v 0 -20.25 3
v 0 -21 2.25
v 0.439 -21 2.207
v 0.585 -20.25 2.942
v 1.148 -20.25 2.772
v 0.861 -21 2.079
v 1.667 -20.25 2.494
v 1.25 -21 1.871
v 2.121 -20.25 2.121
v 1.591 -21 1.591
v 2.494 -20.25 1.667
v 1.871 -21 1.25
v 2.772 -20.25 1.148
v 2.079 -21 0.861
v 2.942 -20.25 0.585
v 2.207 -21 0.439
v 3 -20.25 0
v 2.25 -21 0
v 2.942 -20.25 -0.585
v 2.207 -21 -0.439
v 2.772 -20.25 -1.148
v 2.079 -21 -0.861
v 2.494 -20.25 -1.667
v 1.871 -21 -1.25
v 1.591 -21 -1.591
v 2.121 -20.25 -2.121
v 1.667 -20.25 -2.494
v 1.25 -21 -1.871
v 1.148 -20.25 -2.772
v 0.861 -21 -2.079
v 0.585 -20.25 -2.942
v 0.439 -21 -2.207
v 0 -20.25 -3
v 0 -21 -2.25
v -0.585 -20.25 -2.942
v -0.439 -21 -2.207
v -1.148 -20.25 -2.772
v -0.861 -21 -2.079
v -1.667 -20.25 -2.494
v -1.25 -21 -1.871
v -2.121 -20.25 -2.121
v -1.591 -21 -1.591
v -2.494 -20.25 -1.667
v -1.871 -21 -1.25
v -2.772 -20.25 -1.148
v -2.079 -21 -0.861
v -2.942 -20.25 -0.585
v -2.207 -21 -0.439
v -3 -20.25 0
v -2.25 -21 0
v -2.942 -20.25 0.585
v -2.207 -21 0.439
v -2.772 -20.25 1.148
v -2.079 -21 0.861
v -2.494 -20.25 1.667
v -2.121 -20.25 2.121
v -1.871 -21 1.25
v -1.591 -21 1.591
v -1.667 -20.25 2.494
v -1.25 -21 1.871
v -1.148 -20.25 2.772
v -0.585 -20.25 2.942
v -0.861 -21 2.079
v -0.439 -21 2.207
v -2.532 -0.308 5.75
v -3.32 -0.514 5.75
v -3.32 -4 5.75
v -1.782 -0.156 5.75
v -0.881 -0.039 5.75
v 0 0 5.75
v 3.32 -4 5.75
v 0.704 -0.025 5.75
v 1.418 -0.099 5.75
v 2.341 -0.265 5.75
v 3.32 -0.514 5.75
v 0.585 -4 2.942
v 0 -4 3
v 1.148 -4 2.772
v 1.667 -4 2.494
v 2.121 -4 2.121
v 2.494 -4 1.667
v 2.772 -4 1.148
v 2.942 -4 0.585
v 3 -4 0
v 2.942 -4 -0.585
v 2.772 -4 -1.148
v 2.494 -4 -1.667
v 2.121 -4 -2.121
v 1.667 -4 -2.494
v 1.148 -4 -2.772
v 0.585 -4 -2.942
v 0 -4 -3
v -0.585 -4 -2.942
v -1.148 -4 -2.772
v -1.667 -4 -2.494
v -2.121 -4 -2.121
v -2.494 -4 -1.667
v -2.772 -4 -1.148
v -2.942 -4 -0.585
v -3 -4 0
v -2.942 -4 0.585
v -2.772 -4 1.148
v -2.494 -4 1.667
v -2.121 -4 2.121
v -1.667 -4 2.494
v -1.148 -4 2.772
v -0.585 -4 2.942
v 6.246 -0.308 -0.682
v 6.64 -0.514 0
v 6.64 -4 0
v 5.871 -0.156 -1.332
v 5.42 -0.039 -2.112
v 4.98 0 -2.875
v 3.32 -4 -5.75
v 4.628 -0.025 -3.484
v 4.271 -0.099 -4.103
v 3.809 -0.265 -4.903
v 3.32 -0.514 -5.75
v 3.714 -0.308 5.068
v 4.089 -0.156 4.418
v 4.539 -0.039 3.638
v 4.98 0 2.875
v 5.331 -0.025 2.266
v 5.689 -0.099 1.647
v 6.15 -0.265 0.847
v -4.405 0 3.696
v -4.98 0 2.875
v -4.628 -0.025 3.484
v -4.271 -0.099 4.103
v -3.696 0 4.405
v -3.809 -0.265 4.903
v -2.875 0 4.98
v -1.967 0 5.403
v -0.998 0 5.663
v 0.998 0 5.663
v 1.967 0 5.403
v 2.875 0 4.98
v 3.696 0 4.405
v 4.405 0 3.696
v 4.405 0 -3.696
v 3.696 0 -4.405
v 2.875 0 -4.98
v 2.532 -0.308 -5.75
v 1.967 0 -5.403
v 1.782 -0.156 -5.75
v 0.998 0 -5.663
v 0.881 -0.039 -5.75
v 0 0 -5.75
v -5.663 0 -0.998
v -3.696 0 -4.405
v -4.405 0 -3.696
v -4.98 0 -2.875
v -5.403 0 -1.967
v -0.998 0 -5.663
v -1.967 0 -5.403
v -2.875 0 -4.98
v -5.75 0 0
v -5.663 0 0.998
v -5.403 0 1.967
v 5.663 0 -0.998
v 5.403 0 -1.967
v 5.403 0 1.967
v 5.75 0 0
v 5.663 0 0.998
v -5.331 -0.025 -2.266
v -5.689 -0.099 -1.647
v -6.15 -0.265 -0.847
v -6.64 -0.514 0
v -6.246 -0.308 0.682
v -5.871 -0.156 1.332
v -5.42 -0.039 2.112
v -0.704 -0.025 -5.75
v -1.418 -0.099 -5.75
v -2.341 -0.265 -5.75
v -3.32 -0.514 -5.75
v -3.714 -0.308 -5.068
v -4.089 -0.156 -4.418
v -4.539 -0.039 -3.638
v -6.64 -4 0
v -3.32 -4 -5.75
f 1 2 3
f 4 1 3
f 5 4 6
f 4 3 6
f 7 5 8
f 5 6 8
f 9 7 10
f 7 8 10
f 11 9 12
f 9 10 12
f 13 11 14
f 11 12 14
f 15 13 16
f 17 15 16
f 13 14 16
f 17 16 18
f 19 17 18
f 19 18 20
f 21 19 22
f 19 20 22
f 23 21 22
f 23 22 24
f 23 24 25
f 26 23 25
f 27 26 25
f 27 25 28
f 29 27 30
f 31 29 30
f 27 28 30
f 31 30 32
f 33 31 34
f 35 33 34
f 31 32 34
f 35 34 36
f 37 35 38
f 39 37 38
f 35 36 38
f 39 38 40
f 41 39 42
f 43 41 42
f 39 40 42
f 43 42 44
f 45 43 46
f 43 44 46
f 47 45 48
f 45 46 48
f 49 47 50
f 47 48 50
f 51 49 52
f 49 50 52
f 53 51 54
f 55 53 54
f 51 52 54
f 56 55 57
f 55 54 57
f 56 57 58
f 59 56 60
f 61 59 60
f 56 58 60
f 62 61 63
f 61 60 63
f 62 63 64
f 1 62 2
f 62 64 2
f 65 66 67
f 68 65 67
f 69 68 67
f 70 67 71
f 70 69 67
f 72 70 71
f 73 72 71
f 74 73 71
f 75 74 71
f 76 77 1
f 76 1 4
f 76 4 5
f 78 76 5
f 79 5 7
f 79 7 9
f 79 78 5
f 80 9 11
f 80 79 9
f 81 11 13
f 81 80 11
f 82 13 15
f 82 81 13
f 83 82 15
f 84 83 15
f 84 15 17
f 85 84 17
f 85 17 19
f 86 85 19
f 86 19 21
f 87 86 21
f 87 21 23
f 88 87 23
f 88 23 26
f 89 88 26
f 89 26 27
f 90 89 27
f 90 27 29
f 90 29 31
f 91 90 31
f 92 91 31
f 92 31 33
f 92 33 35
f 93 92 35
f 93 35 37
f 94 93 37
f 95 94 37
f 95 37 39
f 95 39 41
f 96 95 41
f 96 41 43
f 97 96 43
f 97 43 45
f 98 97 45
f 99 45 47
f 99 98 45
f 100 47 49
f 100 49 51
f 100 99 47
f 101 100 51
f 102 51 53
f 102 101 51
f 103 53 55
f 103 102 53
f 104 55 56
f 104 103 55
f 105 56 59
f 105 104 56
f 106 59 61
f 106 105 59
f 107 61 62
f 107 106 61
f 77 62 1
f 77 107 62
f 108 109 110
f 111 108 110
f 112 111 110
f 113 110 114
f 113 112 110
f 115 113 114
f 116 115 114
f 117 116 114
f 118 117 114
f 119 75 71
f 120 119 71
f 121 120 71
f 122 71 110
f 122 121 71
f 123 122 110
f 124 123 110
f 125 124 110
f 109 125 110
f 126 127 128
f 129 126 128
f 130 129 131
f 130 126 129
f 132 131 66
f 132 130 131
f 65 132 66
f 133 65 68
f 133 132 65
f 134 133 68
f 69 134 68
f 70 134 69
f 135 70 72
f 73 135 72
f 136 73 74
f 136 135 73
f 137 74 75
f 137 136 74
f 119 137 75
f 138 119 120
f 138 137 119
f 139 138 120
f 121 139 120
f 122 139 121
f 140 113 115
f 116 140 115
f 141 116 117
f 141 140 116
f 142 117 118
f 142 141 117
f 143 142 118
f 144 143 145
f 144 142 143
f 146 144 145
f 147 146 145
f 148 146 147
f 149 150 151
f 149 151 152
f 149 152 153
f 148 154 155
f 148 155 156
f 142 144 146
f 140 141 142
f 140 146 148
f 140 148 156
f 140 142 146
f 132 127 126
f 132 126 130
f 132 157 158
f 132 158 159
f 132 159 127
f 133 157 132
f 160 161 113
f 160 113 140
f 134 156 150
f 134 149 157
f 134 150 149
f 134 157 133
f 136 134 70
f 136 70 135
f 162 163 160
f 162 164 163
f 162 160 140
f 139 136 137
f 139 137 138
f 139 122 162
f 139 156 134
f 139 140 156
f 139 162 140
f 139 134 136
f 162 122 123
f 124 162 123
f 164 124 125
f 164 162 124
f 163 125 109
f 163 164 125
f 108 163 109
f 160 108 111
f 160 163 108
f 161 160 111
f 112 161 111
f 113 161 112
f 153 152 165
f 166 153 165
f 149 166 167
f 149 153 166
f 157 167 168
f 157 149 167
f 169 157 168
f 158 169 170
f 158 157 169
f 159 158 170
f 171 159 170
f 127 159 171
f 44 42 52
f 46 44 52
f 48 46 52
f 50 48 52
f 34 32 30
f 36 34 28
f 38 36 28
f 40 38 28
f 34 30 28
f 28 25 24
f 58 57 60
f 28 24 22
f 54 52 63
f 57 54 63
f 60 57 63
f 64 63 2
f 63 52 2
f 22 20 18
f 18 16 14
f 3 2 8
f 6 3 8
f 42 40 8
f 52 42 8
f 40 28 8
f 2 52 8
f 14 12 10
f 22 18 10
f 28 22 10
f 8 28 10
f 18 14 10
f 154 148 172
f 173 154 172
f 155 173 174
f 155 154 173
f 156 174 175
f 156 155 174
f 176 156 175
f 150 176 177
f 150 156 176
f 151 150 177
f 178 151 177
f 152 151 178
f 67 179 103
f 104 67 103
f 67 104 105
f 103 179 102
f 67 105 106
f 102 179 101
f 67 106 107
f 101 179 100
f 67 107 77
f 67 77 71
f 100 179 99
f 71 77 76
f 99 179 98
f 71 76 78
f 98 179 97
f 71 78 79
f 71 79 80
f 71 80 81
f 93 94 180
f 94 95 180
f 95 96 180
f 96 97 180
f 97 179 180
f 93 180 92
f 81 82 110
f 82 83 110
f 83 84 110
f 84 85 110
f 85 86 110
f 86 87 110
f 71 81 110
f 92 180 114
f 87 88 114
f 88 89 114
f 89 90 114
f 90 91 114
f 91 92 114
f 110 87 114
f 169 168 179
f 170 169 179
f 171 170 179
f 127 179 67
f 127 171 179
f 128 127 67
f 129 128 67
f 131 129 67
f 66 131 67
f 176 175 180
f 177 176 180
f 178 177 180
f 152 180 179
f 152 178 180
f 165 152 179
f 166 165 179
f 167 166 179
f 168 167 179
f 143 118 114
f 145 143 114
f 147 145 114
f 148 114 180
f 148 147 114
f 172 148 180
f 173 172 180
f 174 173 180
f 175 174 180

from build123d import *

# Parameters (mm, degrees)
BOSS_EXTRUDE2_DEPTH = 4
SKETCH1_7_R         = 3
BOSS_EXTRUDE3_DEPTH = 21
CHAMFER2_SIZE       = 0.75
SKETCH3_OUTSIDE_W   = 93.502
SKETCH3_OUTSIDE_H   = 91.722
SKETCH3_OUTSIDE_R   = 5.75
CUT_EXTRUDE1_DEPTH  = 21
CUT_EXTRUDE1_DRAFT  = -60


with BuildPart() as part:
    # Sketch1 → Boss-Extrude2 (new body)
    with BuildSketch(Plane(origin=(0, 0, 0), x_dir=(1, 0, 0), z_dir=(0, 1, 0))):
        Polygon((3.319764048, -5.75), (6.639528096, 0), (3.319764048, 5.75), (-3.319764048, 5.75), (-6.639528096, 0), (-3.319764048, -5.75), align=None)
    extrude(amount=-BOSS_EXTRUDE2_DEPTH)

    # Sketch1<7> → Boss-Extrude3 (add)
    with BuildSketch(Plane(origin=(0, 0, 0), x_dir=(1, 0, 0), z_dir=(0, 1, 0))):
        Circle(SKETCH1_7_R)
    extrude(amount=-BOSS_EXTRUDE3_DEPTH)

    # Chamfer2
    chamfer2_edges = [part.edges().sort_by_distance(p)[0] for p in [
        (-3, -21, 0),
    ]]
    chamfer(chamfer2_edges, length=CHAMFER2_SIZE)


with BuildPart() as cut_extrude1_tool:
    # Sketch3 outside → Cut-Extrude1 (with draft: the straight prism first)
    with BuildSketch(Plane(origin=(0, 0, 0), x_dir=(1, 0, 0), z_dir=(0, 1, 0))):
        Rectangle(SKETCH3_OUTSIDE_W, SKETCH3_OUTSIDE_H)
        Circle(SKETCH3_OUTSIDE_R, mode=Mode.SUBTRACT)
    extrude(amount=-CUT_EXTRUDE1_DEPTH)
    # Cut-Extrude1: the draft: its side faces are tilted about the plane it starts from
    cut_extrude1_sides = [cut_extrude1_tool.faces().sort_by_distance(p)[0] for p in [
        (0, -10.5, 45.861),
        (46.751, -10.5, 0),
        (0, -10.5, -45.861),
        (-46.751, -10.5, 0),
        (-5.75, -10.5, 0),
    ]]
    draft(cut_extrude1_sides, Plane(origin=(0, 0, 0), x_dir=(1, 0, 0), z_dir=(0, 1, 0)), CUT_EXTRUDE1_DRAFT)


with BuildPart() as part_1:
    add(part.part)

    # Cut-Extrude1: cut by cut_extrude1_tool
    add(cut_extrude1_tool.part, mode=Mode.SUBTRACT)


solid = part_1.part
